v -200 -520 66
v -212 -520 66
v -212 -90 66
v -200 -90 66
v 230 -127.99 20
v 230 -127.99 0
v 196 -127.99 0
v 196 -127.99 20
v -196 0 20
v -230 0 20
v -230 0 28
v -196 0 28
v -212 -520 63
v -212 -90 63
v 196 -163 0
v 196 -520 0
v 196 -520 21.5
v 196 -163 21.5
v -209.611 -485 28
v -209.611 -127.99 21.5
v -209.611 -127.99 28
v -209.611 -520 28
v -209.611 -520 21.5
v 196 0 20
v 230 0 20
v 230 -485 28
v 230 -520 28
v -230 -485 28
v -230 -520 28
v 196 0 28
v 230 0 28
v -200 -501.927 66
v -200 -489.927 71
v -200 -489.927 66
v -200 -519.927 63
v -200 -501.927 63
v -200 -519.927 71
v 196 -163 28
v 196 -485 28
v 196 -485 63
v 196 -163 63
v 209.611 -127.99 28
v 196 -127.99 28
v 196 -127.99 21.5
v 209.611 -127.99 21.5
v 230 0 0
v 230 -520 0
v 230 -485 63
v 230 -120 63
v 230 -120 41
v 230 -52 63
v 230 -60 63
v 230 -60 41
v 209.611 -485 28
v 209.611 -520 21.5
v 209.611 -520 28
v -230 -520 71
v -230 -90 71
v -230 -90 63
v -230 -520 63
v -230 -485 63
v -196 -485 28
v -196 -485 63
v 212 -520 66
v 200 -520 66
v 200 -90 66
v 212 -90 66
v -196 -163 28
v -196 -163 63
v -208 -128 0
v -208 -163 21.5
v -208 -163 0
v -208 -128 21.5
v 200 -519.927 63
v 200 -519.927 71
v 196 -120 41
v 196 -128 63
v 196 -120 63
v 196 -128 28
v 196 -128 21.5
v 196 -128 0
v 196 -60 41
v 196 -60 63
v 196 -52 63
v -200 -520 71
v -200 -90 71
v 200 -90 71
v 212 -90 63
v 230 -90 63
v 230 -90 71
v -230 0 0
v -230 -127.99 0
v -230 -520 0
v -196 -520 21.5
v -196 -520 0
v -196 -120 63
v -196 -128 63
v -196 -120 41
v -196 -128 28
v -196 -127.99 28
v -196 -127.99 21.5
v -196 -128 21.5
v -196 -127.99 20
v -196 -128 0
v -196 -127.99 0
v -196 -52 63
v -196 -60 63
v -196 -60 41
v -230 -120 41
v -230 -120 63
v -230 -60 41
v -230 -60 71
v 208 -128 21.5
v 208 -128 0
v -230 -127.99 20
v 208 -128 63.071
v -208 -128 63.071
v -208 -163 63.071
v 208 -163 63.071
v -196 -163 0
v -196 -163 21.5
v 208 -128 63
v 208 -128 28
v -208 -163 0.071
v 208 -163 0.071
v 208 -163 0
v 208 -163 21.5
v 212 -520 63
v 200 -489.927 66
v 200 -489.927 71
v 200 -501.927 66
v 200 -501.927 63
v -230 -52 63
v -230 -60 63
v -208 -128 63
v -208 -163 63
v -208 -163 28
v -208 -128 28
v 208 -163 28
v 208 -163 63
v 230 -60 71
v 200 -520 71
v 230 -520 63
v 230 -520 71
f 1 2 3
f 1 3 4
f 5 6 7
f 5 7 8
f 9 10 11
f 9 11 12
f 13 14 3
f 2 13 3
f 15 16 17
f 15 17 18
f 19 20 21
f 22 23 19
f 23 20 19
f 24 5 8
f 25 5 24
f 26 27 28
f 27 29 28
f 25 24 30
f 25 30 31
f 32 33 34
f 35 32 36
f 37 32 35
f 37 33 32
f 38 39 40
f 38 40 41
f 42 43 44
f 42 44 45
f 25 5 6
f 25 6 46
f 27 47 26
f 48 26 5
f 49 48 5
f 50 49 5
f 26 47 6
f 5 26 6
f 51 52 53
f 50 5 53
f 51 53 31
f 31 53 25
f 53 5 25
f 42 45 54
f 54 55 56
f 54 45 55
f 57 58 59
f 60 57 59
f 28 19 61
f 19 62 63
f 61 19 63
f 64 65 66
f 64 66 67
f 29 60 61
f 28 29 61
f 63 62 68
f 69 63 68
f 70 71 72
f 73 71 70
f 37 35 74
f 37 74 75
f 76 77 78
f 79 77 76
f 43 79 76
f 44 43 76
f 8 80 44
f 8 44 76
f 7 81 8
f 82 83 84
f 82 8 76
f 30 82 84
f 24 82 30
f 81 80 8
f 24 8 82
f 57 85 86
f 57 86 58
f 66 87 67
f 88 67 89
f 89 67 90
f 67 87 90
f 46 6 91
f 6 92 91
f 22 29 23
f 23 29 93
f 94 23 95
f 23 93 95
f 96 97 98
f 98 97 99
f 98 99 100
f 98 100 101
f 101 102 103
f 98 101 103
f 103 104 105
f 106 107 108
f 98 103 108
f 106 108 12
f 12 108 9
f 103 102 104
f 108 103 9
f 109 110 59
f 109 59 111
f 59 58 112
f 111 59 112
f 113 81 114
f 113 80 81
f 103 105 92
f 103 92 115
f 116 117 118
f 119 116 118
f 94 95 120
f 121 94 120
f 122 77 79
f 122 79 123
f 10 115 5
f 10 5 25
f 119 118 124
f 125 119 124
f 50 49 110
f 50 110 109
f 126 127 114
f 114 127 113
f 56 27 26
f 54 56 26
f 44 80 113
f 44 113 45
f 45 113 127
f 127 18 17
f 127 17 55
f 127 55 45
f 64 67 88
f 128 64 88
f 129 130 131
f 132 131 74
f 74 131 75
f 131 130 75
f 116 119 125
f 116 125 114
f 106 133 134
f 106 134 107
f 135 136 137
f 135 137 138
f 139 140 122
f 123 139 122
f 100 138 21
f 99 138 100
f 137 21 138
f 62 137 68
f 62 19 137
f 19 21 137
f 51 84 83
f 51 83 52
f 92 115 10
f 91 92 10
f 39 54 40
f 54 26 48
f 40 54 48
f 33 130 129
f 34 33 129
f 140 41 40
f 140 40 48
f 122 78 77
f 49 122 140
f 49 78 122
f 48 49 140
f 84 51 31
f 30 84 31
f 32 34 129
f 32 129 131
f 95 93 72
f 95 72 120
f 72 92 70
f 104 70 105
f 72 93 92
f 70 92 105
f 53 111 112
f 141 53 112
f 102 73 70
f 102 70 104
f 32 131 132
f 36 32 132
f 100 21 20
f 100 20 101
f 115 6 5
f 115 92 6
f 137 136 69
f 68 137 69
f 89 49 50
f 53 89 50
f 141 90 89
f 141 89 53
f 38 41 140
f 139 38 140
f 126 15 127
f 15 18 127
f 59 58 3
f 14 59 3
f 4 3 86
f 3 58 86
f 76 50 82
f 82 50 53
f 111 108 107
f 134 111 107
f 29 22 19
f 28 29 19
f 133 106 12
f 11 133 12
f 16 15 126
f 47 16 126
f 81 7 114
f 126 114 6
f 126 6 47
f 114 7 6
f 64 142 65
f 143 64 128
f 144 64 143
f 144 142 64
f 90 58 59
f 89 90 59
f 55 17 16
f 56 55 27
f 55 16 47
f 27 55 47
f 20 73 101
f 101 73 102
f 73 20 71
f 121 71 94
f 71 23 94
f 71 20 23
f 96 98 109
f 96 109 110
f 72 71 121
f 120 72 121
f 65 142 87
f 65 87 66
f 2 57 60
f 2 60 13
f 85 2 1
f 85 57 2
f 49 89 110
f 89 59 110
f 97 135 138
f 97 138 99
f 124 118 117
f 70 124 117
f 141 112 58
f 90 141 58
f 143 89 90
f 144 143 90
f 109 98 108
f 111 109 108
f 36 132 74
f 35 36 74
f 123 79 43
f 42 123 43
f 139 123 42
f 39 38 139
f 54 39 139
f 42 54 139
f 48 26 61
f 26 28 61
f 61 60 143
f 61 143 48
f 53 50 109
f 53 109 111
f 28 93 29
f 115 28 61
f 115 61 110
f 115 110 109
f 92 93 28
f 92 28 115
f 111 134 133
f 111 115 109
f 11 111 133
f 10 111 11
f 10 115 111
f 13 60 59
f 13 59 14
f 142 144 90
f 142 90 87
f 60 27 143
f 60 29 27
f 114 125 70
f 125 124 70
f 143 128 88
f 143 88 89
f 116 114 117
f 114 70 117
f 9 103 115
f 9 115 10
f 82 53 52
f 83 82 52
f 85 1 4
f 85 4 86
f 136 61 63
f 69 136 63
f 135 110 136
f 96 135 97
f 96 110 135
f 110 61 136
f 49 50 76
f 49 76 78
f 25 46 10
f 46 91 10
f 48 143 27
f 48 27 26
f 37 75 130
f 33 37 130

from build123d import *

# Parameters (mm, degrees)
F0_W           = 34
F0_H           = 520
F1_DEPTH       = 63
F2_W           = 35
F2_H           = 35
F2_W_2         = 60
F2_H_2         = 22
F2_W_3         = 127.99
F2_H_3         = 20
F3_DEPTH       = 460.001
F5_DEPTH       = 230
F5_DEPTH_BACK  = 230
F4_W           = 35
F4_H           = 35
F4_W_2         = 127.99
F4_H_2         = 20
F6_W           = 42.871
F6_H           = 6.5
F7_DEPTH       = 392.01
F8_W           = 25.496352553
F8_H           = 35
F9_DEPTH       = 63.001
F11_DEPTH      = 208
F11_DEPTH_BACK = 208
F13_DEPTH      = 430
F15_DEPTH      = 400


with BuildPart() as f1:
    # F0 (on Top) → F1 (new body)
    with BuildSketch(Plane.XY):
        with Locations((-213, -260)):
            Rectangle(F0_W, F0_H)
    extrude(amount=F1_DEPTH)


with BuildPart() as f1b:
    # F0 (on Top) → F1, piece 2 (new body)
    with BuildSketch(Plane.XY):
        with Locations((213, -260)):
            Rectangle(F0_W, F0_H)
    extrude(amount=F1_DEPTH)


with BuildPart() as f3_tool:
    # F2 (on face) → F3 (new body, through all)
    with BuildSketch(Plane.YZ.offset(230)):
        with Locations((-502.5, 45.5)):
            Rectangle(F2_W, F2_H)
        with Locations((-90, 52)):
            Rectangle(F2_W_2, F2_H_2)
        with Locations((-63.995, 10)):
            Rectangle(F2_W_3, F2_H_3)
        Polygon((-52, 69.1977664828), (-52, 63), (0, 28), (7.8393500298, 28), (7.8393500298, 69.1977664828), align=None)
    extrude(amount=-F3_DEPTH)


with BuildPart() as f1_1:
    add(f1.part)

    # F3: cut by f3_tool
    add(f3_tool.part, mode=Mode.SUBTRACT)


with BuildPart() as f1b_1:
    add(f1b.part)

    # F3: cut by f3_tool
    add(f3_tool.part, mode=Mode.SUBTRACT)


with BuildPart() as f5:
    # F4 (on Right) → F5 (new body, two sides)
    with BuildSketch(Plane.YZ) as f5_sk:
        Polygon((-90, 71), (-90, 63), (-120, 63), (-120, 41), (-60, 41), (-60, 71), align=None)
    extrude(amount=-F5_DEPTH)
    extrude(f5_sk.sketch, amount=F5_DEPTH_BACK)


with BuildPart() as f5b:
    # F4 (on Right) → F5, piece 2 (new body, two sides)
    with BuildSketch(Plane.YZ) as f5_2_sk:
        with Locations((-502.5, 45.5)):
            Rectangle(F4_W, F4_H)
    extrude(amount=-F5_DEPTH)
    extrude(f5_2_sk.sketch, amount=F5_DEPTH_BACK)


with BuildPart() as f5c:
    # F4 (on Right) → F5, piece 3 (new body, two sides)
    with BuildSketch(Plane.YZ) as f5_3_sk:
        with Locations((-63.995, 10)):
            Rectangle(F4_W_2, F4_H_2)
    extrude(amount=-F5_DEPTH)
    extrude(f5_3_sk.sketch, amount=F5_DEPTH_BACK)


with BuildPart() as f7_tool:
    # F6 (on face) → F7 (new body, through all)
    with BuildSketch(Plane.XZ.offset(520)):
        with Locations((-188.1759025793, 24.75)):
            Rectangle(F6_W, F6_H)
        with Locations((188.1759025793, 24.75)):
            Rectangle(F6_W, F6_H)
    extrude(amount=-F7_DEPTH)


with BuildPart() as f1_2:
    add(f1_1.part)

    # F7: cut by f7_tool
    add(f7_tool.part, mode=Mode.SUBTRACT)


with BuildPart() as f1b_2:
    add(f1b_1.part)

    # F7: cut by f7_tool
    add(f7_tool.part, mode=Mode.SUBTRACT)


with BuildPart() as f9_tool:
    # F8 (on face) → F9 (new body, through all)
    with BuildSketch(Plane.XY.offset(63)):
        with Locations((-195.2518237235, -145.5)):
            Rectangle(F8_W, F8_H)
        with Locations((195.2518237235, -145.5)):
            Rectangle(F8_W, F8_H)
    extrude(amount=-F9_DEPTH)


with BuildPart() as f1_3:
    add(f1_2.part)

    # F9: cut by f9_tool
    add(f9_tool.part, mode=Mode.SUBTRACT)


with BuildPart() as f1b_3:
    add(f1b_2.part)

    # F9: cut by f9_tool
    add(f9_tool.part, mode=Mode.SUBTRACT)


with BuildPart() as f11:
    # F10 (on Right) → F11 (new body, two sides)
    with BuildSketch(Plane.YZ) as f11_sk:
        Polygon((-163, 63.0713881249), (-163, 0.0713881249), (-128, 0), (-128, 63.0713881249), align=None)
    extrude(amount=-F11_DEPTH)
    extrude(f11_sk.sketch, amount=F11_DEPTH_BACK)


with BuildPart() as f13:
    # F12 (on face) → F13 (new body, through all)
    with BuildSketch(Plane.XZ.offset(520)):
        Polygon((212, 63), (230, 63), (230, 71), (200, 71), (200, 66), (212, 66), align=None)
    extrude(amount=-F13_DEPTH)


with BuildPart() as f13b:
    # F12 (on face) → F13, piece 2 (new body, through all)
    with BuildSketch(Plane.XZ.offset(520)):
        Polygon((-212, 66), (-200, 66), (-200, 71), (-230, 71), (-230, 63), (-212, 63), align=None)
    extrude(amount=-F13_DEPTH)


with BuildPart() as f15:
    # F14 (on face) → F15 (new body, through all)
    with BuildSketch(Plane(origin=(200, 0, 0), x_dir=(0, -1, 0), z_dir=(-1, 0, 0))):
        Polygon((501.9269328117, 62.9998991688), (519.9269328117, 62.9998991688), (519.9269328117, 70.9998991688), (489.9269328117, 70.9998991688), (489.9269328117, 65.9998991688), (501.9269328117, 65.9998991688), align=None)
    extrude(amount=F15_DEPTH)


solid = Compound([f5.part, f5b.part, f5c.part, f1_3.part, f1b_3.part, f11.part, f13.part, f13b.part, f15.part])
